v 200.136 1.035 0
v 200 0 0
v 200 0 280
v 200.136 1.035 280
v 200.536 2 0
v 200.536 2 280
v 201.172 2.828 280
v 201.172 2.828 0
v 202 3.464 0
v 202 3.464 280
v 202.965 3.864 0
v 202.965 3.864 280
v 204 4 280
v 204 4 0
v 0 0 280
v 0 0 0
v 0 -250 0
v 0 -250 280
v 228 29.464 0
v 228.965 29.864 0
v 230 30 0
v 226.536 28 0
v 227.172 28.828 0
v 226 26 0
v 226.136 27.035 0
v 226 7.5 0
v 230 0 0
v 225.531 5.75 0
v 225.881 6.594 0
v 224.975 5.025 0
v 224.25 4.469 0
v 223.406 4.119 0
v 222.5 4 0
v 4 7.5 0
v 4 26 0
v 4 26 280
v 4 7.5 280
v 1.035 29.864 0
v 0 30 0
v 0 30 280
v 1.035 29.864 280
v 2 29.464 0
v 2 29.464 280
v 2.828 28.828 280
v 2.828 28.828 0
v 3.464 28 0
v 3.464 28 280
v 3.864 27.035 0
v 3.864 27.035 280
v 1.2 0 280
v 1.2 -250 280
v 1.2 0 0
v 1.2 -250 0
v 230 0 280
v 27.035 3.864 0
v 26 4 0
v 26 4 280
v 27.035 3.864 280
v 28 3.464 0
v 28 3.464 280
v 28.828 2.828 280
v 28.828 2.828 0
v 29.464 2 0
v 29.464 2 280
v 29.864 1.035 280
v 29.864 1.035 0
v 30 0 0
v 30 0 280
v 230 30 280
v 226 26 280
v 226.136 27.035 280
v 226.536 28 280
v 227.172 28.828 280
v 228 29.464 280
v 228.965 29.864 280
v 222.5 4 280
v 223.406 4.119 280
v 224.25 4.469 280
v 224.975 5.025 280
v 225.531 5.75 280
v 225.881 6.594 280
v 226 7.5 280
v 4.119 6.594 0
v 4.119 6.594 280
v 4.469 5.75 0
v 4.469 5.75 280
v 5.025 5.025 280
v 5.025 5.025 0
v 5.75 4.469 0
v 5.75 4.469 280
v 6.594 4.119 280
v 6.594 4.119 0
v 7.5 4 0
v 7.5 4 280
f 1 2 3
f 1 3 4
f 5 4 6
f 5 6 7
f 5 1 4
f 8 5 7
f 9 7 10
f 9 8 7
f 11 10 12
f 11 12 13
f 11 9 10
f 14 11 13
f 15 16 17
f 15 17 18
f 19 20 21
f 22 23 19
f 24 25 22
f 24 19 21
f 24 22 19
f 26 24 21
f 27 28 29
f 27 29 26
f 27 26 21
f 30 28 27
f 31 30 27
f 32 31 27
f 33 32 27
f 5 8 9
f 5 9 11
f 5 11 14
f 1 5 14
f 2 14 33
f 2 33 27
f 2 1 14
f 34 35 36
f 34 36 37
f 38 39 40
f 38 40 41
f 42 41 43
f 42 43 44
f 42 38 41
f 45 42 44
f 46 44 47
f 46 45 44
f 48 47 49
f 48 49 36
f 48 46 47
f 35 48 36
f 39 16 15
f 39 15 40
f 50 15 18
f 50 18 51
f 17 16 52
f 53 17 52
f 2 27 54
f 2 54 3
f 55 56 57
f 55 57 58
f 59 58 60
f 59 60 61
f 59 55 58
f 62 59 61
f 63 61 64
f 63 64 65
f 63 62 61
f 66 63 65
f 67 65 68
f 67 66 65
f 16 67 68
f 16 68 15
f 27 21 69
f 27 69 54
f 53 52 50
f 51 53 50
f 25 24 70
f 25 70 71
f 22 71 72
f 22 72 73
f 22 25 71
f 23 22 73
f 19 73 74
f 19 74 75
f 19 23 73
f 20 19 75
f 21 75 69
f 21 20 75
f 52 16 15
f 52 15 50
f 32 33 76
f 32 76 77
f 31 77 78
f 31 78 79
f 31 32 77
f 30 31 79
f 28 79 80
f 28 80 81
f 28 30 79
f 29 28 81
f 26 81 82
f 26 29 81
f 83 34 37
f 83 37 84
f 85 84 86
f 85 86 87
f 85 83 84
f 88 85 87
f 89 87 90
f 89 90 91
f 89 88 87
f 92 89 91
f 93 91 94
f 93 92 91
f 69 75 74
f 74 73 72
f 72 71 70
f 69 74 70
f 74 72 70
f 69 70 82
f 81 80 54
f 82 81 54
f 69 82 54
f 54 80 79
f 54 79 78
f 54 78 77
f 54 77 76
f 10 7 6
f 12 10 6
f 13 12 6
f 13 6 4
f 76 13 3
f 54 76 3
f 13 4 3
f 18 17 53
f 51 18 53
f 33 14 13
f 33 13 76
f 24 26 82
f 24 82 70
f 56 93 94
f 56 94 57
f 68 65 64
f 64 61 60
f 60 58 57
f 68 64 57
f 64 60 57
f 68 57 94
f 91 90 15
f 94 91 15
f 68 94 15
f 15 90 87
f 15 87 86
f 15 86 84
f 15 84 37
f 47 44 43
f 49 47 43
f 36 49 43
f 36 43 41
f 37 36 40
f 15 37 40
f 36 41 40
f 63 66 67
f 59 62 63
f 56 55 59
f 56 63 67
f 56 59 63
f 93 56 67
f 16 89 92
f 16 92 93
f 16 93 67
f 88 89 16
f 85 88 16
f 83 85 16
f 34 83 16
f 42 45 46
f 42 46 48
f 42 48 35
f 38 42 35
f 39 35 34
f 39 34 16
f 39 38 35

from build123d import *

# Parameters (mm, degrees)
ANGLE_IRON_25_X_25_X_4_1_DEPTH   = 280
ANGLE_IRON_25_X_25_X_4_1_2_DEPTH = 280
SKETCH12_W                       = 1.2
SKETCH12_H                       = 280
BOSS_EXTRUDE1_DEPTH              = 250


with BuildPart() as part:
    # Sketch11 → Angle iron 25 X 25 X 4(1) (new body)
    with BuildSketch(Plane.XY):
        with BuildLine():
            Line((0, 0), (0, 30))
            ThreePointArc((0, 30), (2.828427125, 28.828427125), (4, 26))
            Line((4, 26), (4, 7.5))
            ThreePointArc((4, 7.5), (5.025126266, 5.025126266), (7.5, 4))
            Line((7.5, 4), (26, 4))
            ThreePointArc((26, 4), (28.828427125, 2.828427125), (30, 0))
            Line((30, 0), (0, 0))
        make_face()
    extrude(amount=ANGLE_IRON_25_X_25_X_4_1_DEPTH)


with BuildPart() as body_2:
    # Sketch11 on segment 2 (carried to segment 2) → Angle iron 25 X 25 X 4_1 2 (new body)
    with BuildSketch(Plane(origin=(230, 0, 0), x_dir=(0, 1, 0), z_dir=(0, 0, 1))):
        with BuildLine():
            Line((0, 0), (0, 30))
            ThreePointArc((0, 30), (2.828427125, 28.828427125), (4, 26))
            Line((4, 26), (4, 7.5))
            ThreePointArc((4, 7.5), (5.025126266, 5.025126266), (7.5, 4))
            Line((7.5, 4), (26, 4))
            ThreePointArc((26, 4), (28.828427125, 2.828427125), (30, 0))
            Line((30, 0), (0, 0))
        make_face()
    extrude(amount=ANGLE_IRON_25_X_25_X_4_1_2_DEPTH)


with BuildPart() as body_3:
    # Sketch12 → Boss-Extrude1 (new body)
    with BuildSketch(Plane.XZ):
        with Locations((0.6, 140)):
            Rectangle(SKETCH12_W, SKETCH12_H)
    extrude(amount=BOSS_EXTRUDE1_DEPTH)


solid = Compound([part.part, body_2.part, body_3.part])
